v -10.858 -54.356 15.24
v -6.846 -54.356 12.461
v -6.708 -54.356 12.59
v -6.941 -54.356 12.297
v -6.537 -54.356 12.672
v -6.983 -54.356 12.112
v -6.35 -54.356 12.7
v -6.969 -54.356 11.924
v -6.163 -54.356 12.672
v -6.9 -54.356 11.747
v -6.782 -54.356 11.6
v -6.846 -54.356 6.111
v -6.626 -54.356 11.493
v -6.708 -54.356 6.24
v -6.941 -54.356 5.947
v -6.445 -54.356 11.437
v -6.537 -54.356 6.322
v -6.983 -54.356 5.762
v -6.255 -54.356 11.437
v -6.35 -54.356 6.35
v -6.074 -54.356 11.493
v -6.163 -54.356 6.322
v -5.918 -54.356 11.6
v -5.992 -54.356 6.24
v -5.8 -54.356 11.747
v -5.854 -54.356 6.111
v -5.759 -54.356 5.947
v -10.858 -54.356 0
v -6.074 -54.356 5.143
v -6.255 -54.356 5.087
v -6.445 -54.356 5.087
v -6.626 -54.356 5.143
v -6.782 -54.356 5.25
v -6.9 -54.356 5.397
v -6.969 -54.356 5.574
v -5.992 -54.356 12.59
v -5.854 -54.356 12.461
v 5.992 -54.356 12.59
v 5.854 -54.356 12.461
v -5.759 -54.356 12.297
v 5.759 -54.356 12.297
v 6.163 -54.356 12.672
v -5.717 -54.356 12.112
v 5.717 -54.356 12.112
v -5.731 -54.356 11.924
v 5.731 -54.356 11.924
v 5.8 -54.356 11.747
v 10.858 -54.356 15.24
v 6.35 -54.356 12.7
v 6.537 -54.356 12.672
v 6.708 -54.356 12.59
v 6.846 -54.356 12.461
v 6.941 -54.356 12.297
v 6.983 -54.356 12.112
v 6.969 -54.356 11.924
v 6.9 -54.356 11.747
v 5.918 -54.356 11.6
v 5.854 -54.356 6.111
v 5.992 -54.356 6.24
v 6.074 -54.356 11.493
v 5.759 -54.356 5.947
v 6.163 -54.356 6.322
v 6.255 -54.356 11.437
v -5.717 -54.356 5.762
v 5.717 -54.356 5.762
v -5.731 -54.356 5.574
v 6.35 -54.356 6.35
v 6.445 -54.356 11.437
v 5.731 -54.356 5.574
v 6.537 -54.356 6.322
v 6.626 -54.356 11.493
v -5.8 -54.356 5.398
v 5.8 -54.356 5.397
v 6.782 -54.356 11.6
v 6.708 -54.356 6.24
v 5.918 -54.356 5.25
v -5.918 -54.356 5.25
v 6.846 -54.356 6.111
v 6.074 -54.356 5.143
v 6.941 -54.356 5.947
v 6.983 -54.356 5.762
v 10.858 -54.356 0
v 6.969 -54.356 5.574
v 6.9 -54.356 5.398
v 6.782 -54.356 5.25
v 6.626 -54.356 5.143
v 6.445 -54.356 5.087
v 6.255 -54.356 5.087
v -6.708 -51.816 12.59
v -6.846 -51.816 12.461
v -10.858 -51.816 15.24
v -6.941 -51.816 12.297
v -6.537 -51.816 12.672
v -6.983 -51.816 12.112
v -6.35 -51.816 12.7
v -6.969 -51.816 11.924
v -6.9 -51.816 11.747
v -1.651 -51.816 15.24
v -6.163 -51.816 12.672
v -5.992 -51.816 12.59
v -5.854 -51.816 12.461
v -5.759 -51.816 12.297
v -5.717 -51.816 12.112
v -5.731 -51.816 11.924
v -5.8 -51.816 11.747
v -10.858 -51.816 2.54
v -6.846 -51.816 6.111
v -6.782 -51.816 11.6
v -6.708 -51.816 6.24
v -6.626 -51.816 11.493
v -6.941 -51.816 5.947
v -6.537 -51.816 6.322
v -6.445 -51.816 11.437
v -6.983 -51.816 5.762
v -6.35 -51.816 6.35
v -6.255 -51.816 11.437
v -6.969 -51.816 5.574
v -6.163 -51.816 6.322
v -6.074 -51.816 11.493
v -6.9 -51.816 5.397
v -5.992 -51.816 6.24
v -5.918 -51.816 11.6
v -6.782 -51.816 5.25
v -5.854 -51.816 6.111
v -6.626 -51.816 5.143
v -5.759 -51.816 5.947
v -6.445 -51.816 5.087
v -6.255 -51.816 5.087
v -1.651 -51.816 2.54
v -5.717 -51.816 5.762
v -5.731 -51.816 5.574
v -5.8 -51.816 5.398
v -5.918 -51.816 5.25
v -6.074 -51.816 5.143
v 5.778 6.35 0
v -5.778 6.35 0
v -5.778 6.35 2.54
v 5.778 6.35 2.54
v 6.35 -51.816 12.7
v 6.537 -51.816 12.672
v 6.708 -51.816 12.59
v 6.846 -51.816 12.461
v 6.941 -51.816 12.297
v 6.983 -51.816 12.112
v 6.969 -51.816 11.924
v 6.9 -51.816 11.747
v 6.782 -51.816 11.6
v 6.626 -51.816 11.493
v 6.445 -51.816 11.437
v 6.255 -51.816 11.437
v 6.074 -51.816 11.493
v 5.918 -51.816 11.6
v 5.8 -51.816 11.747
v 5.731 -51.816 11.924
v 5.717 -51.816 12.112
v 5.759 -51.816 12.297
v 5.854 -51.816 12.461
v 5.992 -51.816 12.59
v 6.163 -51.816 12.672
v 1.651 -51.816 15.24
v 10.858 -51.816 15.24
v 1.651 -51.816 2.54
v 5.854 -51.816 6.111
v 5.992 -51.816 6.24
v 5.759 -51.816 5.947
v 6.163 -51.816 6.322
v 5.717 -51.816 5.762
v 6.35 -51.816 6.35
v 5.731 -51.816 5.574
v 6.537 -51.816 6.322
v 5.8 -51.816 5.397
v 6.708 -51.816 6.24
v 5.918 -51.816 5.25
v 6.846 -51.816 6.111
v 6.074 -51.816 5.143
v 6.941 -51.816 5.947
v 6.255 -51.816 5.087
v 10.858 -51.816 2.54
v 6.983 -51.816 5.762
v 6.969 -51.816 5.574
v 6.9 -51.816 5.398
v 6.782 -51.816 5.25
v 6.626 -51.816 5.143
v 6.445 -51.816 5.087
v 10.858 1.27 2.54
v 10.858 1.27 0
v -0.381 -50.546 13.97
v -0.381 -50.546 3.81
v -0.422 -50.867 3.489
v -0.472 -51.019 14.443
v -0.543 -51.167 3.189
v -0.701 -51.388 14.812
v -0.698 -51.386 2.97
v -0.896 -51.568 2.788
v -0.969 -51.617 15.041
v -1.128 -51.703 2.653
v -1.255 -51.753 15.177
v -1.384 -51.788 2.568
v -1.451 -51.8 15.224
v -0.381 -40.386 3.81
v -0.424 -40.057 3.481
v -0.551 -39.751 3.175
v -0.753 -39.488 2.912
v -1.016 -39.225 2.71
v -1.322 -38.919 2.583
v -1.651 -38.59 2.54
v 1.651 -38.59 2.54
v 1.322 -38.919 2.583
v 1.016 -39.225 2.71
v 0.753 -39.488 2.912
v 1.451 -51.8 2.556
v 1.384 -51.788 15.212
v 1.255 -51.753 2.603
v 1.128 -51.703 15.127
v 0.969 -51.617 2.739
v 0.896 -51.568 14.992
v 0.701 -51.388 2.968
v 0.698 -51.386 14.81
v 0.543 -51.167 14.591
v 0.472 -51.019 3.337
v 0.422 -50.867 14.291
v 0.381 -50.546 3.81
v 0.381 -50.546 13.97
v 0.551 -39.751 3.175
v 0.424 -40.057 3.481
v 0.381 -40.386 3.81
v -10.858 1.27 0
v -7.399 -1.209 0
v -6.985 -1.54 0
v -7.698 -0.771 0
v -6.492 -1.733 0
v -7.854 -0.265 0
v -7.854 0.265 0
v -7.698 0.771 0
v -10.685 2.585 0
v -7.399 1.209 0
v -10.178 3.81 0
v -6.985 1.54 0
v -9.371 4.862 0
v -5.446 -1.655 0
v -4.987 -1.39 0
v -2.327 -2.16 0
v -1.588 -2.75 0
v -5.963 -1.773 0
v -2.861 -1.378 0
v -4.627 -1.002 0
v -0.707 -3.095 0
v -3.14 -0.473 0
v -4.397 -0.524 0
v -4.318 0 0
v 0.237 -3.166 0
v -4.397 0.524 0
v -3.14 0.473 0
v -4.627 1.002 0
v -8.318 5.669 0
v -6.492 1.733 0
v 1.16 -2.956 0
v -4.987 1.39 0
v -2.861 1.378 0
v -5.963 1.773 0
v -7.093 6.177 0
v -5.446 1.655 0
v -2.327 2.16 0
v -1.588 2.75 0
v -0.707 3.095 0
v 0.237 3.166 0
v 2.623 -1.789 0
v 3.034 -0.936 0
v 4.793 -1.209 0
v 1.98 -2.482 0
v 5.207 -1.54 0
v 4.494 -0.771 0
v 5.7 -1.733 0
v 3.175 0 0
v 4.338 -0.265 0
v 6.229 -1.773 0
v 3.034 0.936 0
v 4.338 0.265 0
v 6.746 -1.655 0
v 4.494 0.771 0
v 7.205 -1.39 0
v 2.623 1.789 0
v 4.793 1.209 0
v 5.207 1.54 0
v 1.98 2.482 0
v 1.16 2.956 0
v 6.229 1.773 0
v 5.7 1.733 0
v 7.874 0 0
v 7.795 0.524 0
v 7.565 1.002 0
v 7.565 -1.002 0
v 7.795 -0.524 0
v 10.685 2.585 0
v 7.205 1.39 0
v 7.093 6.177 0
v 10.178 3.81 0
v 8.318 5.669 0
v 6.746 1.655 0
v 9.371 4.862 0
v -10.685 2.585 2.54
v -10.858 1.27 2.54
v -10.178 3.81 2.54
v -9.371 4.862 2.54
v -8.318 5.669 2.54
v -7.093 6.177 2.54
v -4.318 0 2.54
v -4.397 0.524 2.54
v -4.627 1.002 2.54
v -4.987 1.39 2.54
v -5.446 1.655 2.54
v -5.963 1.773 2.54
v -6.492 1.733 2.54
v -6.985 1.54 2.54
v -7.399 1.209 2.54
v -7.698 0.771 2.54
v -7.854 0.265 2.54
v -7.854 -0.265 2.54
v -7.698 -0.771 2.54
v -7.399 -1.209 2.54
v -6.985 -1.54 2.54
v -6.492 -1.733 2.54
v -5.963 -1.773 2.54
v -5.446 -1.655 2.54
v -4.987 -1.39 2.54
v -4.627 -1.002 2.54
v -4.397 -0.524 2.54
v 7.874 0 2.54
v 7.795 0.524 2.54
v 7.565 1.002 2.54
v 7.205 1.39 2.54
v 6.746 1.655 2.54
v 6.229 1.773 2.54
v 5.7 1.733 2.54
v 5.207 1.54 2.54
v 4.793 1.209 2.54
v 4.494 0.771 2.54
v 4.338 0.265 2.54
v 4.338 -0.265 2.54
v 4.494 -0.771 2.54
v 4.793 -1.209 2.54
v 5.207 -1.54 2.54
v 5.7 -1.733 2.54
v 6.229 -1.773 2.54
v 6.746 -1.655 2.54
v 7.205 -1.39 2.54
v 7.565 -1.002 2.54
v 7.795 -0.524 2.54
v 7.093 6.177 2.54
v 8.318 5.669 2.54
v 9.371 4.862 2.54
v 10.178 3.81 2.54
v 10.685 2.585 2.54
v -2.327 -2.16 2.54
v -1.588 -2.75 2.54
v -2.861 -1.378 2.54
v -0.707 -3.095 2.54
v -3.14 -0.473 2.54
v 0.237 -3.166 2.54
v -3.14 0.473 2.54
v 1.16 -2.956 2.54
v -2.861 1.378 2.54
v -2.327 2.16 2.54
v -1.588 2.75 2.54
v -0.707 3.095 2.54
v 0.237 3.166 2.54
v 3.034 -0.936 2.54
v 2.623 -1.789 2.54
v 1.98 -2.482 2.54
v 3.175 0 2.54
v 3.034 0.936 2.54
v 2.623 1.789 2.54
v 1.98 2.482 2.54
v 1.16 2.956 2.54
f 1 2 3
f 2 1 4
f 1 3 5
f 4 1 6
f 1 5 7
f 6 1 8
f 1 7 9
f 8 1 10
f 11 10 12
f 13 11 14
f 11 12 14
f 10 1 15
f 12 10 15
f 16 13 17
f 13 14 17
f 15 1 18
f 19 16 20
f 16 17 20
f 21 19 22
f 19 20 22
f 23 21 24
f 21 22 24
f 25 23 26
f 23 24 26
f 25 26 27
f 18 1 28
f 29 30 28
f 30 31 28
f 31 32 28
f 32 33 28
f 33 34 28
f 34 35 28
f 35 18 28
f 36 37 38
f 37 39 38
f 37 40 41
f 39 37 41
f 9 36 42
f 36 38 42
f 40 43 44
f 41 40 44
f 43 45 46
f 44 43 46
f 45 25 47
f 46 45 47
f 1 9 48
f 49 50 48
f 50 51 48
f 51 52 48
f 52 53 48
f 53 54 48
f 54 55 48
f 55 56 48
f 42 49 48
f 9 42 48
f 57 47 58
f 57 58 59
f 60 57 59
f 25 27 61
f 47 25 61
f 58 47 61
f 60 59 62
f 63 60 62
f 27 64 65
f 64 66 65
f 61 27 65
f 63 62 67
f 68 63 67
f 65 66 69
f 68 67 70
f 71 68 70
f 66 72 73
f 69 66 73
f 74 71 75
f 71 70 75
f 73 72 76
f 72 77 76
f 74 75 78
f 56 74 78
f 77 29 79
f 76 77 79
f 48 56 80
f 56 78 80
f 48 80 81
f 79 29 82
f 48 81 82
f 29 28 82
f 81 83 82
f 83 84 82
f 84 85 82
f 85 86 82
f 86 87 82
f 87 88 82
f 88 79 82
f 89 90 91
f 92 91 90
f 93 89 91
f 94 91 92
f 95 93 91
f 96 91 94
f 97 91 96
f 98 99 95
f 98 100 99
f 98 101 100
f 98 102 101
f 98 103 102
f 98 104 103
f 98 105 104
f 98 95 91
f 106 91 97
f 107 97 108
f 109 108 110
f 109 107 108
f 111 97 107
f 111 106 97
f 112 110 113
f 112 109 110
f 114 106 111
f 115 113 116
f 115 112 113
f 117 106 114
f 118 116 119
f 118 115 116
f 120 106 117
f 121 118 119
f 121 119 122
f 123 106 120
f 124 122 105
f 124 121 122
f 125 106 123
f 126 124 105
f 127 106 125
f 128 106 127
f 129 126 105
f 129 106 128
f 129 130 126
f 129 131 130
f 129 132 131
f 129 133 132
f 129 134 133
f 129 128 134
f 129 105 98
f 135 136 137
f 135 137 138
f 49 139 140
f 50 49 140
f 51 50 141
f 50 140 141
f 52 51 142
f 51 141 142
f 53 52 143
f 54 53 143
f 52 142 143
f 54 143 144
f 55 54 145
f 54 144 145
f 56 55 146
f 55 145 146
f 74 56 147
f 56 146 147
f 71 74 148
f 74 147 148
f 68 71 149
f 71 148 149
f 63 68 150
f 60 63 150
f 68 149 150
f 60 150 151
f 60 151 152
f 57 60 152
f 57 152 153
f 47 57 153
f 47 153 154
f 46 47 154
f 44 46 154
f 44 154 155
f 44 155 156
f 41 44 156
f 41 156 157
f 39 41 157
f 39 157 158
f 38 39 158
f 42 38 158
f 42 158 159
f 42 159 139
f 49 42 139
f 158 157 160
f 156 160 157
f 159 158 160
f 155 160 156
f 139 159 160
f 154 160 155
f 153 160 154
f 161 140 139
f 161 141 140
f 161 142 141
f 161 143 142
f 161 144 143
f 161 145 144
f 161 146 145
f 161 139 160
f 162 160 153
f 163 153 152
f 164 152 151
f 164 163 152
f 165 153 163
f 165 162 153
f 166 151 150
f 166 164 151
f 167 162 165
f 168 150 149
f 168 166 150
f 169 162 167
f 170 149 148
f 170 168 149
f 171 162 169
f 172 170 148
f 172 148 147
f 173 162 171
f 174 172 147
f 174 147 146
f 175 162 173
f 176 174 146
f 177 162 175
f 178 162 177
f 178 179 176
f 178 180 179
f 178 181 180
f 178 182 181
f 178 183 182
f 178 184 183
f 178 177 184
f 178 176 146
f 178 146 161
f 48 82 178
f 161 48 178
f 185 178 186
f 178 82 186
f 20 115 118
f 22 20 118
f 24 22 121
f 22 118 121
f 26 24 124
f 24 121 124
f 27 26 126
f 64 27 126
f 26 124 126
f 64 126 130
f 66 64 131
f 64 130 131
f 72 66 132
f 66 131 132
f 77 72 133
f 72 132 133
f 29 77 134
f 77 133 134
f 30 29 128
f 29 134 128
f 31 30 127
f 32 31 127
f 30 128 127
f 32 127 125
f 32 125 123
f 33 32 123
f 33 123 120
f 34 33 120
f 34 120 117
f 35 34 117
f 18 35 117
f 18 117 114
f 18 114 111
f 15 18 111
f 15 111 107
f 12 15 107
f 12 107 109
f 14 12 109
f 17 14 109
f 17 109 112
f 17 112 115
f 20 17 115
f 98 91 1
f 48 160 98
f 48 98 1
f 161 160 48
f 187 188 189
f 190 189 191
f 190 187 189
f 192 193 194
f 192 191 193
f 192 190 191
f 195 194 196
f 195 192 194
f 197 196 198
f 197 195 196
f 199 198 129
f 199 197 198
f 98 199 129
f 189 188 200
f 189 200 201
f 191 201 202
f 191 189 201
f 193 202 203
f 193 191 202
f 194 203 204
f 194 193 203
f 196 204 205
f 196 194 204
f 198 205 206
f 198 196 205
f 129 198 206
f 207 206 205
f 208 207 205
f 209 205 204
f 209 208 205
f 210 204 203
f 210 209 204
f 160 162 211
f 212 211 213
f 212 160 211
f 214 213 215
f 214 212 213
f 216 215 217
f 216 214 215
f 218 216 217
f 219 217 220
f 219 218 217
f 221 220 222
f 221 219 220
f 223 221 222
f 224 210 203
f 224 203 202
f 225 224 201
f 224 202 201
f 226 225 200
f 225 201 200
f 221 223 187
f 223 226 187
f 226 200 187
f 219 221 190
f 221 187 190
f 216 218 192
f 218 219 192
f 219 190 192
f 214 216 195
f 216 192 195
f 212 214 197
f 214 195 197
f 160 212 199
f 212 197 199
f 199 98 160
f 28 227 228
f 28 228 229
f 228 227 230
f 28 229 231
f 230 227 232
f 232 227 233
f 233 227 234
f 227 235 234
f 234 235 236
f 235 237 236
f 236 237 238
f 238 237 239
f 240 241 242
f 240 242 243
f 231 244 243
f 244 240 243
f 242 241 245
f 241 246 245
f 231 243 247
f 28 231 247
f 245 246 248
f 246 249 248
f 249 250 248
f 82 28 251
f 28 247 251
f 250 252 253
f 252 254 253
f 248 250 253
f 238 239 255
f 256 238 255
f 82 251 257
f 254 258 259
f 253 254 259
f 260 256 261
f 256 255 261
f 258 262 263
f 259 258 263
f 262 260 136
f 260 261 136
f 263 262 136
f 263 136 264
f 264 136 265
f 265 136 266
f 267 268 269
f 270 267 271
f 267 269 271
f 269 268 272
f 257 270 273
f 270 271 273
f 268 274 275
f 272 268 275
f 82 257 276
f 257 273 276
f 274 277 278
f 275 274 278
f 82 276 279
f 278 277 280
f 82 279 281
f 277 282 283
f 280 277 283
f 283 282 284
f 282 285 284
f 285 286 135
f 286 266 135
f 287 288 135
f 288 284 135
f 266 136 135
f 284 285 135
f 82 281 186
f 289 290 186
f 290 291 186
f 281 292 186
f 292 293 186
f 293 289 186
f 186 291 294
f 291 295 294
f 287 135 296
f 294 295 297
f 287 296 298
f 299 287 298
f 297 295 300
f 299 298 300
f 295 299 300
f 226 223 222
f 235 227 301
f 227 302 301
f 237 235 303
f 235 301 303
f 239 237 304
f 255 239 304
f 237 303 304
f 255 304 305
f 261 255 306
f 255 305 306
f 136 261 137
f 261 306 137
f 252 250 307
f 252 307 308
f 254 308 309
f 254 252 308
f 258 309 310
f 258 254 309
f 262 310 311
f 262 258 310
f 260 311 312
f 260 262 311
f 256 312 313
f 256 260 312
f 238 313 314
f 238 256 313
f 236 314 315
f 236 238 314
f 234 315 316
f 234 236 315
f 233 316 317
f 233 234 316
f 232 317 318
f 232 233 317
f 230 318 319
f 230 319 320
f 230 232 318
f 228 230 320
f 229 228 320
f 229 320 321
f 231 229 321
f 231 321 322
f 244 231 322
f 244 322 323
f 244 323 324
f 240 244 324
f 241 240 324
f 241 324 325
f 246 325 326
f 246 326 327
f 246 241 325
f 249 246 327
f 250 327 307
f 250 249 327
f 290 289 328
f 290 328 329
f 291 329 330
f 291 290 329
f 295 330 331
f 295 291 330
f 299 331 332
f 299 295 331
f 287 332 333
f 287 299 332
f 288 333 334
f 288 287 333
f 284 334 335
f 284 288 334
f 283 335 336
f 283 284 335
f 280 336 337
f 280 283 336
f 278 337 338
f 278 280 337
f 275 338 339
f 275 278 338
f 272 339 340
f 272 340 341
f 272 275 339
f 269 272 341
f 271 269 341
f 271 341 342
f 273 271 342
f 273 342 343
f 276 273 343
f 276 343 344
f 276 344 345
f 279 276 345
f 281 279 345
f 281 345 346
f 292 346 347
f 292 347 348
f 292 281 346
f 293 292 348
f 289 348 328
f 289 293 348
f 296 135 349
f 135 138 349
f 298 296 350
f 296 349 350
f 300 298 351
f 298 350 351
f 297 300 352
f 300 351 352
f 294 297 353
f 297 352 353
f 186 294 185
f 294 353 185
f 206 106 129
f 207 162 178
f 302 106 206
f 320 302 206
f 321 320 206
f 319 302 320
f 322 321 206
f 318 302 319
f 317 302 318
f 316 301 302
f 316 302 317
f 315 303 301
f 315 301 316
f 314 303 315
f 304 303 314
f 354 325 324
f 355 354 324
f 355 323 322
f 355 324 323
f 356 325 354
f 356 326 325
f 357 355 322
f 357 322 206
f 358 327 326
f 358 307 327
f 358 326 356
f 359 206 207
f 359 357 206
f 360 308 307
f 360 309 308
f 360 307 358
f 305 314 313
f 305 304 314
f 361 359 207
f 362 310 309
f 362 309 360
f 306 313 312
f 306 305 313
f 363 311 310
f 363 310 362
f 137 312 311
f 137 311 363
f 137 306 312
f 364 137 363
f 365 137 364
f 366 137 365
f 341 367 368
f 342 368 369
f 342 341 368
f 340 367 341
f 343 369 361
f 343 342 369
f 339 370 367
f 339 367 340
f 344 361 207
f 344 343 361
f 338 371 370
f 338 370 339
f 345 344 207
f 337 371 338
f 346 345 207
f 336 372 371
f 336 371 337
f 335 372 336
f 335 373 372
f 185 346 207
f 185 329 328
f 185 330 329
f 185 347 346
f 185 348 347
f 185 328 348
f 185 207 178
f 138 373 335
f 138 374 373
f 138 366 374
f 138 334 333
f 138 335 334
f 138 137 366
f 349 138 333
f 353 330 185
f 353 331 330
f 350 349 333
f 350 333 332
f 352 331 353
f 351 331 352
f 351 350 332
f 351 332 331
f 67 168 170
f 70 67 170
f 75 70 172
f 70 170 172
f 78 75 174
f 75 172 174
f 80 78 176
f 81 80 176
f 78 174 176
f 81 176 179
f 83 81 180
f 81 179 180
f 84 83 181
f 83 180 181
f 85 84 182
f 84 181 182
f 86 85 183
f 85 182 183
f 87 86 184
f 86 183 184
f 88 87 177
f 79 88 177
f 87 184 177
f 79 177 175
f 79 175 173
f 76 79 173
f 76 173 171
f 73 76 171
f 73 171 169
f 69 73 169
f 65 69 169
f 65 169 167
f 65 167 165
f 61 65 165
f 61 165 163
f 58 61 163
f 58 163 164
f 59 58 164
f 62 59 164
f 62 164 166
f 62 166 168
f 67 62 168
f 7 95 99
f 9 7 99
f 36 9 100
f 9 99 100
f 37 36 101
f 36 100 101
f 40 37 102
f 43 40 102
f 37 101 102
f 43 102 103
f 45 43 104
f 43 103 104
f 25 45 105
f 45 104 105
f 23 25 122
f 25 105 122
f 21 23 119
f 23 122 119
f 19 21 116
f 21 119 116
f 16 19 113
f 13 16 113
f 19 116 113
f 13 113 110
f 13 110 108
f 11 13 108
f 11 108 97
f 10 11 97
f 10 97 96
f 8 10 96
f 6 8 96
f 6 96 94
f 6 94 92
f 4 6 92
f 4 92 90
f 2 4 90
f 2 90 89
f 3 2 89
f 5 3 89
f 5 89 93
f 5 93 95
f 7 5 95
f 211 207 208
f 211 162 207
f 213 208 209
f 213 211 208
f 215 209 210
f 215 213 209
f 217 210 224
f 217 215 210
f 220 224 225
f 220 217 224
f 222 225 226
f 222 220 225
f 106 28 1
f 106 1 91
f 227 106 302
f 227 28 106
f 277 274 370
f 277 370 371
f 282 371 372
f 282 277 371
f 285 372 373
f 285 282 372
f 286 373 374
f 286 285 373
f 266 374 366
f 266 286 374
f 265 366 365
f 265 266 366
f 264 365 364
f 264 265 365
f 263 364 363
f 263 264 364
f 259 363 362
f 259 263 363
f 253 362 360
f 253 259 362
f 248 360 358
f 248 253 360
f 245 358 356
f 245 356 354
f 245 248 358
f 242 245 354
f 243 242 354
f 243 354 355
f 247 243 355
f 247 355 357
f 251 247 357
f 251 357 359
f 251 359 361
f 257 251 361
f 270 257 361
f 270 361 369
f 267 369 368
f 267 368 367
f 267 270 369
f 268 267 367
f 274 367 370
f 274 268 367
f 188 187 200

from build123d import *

# Parameters (mm, degrees)
SKETCH2_W                = 21.717
SKETCH2_H                = 60.706
SKETCH2_R                = 3.175
SKETCH2_R_2              = 1.778
BOSS_EXTRUDE1_DEPTH      = 2.54
SKETCH3_W                = 21.717
SKETCH3_H                = 2.54
BOSS_EXTRUDE2_DEPTH      = 12.7
BOSS_EXTRUDE3_DEPTH      = 0.381
BOSS_EXTRUDE3_DEPTH_BACK = 0.381
SKETCH6_R                = 0.635
CUT_EXTRUDE1_DEPTH       = 62.101949054
FILLET1_R                = 5.08
FILLET2_R                = 1.27


with BuildPart() as part:
    # Sketch2 → Boss-Extrude1 (new body)
    with BuildSketch(Plane.XY):
        with Locations((0, -24.003)):
            Rectangle(SKETCH2_W, SKETCH2_H)
        Circle(SKETCH2_R, mode=Mode.SUBTRACT)
        with Locations((6.096, 0)):
            Circle(SKETCH2_R_2, mode=Mode.SUBTRACT)
        with Locations((-6.096, 0)):
            Circle(SKETCH2_R_2, mode=Mode.SUBTRACT)
    extrude(amount=BOSS_EXTRUDE1_DEPTH)

    # Sketch3 → Boss-Extrude2 (add)
    with BuildSketch(Plane.XY.offset(2.54)):
        with Locations((0, -53.086)):
            Rectangle(SKETCH3_W, SKETCH3_H)
    extrude(amount=BOSS_EXTRUDE2_DEPTH)

    # Sketch5 → Boss-Extrude3 (add, two sides: drawn at the far end of the back side and taken through both)
    with BuildSketch(Plane.ZY.offset(-BOSS_EXTRUDE3_DEPTH_BACK)):
        Polygon((15.24, -51.816), (2.54, -51.816), (2.54, -39.116), align=None)
    extrude(amount=BOSS_EXTRUDE3_DEPTH + BOSS_EXTRUDE3_DEPTH_BACK)

    # Sketch6 → Cut-Extrude1 (cut, through all)
    with BuildSketch(Plane(origin=(0, -51.816, 0), x_dir=(1, 0, 0), z_dir=(0, 1, 0))):
        with Locations(Location((-6.35, -5.715, 0), (0, 0, 270))):
            Circle(SKETCH6_R)
        with Locations(Location((6.35, -5.715, 0), (0, 0, 270))):
            Circle(SKETCH6_R)
        with Locations(Location((6.35, -12.065, 0), (0, 0, 270))):
            Circle(SKETCH6_R)
        with Locations(Location((-6.35, -12.065, 0), (0, 0, 270))):
            Circle(SKETCH6_R)
    extrude(amount=-CUT_EXTRUDE1_DEPTH, mode=Mode.SUBTRACT)

    # Fillet1
    fillet1_edges = [part.edges().sort_by_distance(p)[0] for p in [
        (10.8585, 6.35, 1.27),
        (-10.8585, 6.35, 1.27),
    ]]
    fillet(fillet1_edges, radius=FILLET1_R)

    # Fillet2
    # the kernel refuses this fillet: 1.27 mm, written as the material it adds along each edge
    with BuildSketch(Plane(origin=(0.381, -51.816, 2.54), x_dir=(1, 0, 0), z_dir=(0, 1, 0))) as fillet2_piece_1_section:
        with BuildLine():
            CenterArc((FILLET2_R, -FILLET2_R), FILLET2_R, 90, 90)
            Line((0, -FILLET2_R), (-FILLET2_R * 0.02, -FILLET2_R))
            Line((-FILLET2_R * 0.02, -FILLET2_R), (-FILLET2_R * 0.02, FILLET2_R * 0.02))
            Line((-FILLET2_R * 0.02, FILLET2_R * 0.02), (FILLET2_R, FILLET2_R * 0.02))
            Line((FILLET2_R, FILLET2_R * 0.02), (FILLET2_R, 0))
        make_face()
    fillet2_piece_1 = extrude(amount=15.875, mode=Mode.PRIVATE)
    fillet2_piece_1 = split(fillet2_piece_1, bisect_by=Plane(origin=(0.67208957, -42.502111902, 5.926111902), z_dir=(0, -0.7071067811865475, -0.7071067811865477)), keep=Keep.TOP, mode=Mode.PRIVATE)
    add(fillet2_piece_1)
    with BuildSketch(Plane(origin=(-0.381, -51.816, 2.54), x_dir=(-1, 0, 0), z_dir=(0, 1, 0))) as fillet2_piece_2_section:
        with BuildLine():
            CenterArc((FILLET2_R, FILLET2_R), FILLET2_R, 180, 90)
            Line((0, FILLET2_R), (-FILLET2_R * 0.02, FILLET2_R))
            Line((-FILLET2_R * 0.02, FILLET2_R), (-FILLET2_R * 0.02, -FILLET2_R * 0.02))
            Line((-FILLET2_R * 0.02, -FILLET2_R * 0.02), (FILLET2_R, -FILLET2_R * 0.02))
            Line((FILLET2_R, -FILLET2_R * 0.02), (FILLET2_R, 0))
        make_face()
    fillet2_piece_2 = extrude(amount=15.875, mode=Mode.PRIVATE)
    fillet2_piece_2 = split(fillet2_piece_2, bisect_by=Plane(origin=(-0.67208957, -42.502111902, 5.926111902), z_dir=(0, -0.7071067811865475, -0.7071067811865477)), keep=Keep.TOP, mode=Mode.PRIVATE)
    add(fillet2_piece_2)
    with BuildSketch(Plane(origin=(-0.381, -51.816, 15.24), x_dir=(0, 1, 0), z_dir=(0, 0, -1))) as fillet2_piece_3_section:
        with BuildLine():
            CenterArc((FILLET2_R, -FILLET2_R), FILLET2_R, 90, 90)
            Line((0, -FILLET2_R), (-FILLET2_R * 0.02, -FILLET2_R))
            Line((-FILLET2_R * 0.02, -FILLET2_R), (-FILLET2_R * 0.02, FILLET2_R * 0.02))
            Line((-FILLET2_R * 0.02, FILLET2_R * 0.02), (FILLET2_R, FILLET2_R * 0.02))
            Line((FILLET2_R, FILLET2_R * 0.02), (FILLET2_R, 0))
        make_face()
    fillet2_piece_3 = extrude(amount=12.7, mode=Mode.PRIVATE)
    fillet2_piece_3 = split(fillet2_piece_3, bisect_by=Plane(origin=(-0.672062457, -48.429609874, 11.853609874), z_dir=(0, -0.7071067811865475, -0.7071067811865477)), keep=Keep.TOP, mode=Mode.PRIVATE)
    add(fillet2_piece_3)
    with BuildSketch(Plane(origin=(0.381, -51.816, 15.24), x_dir=(1, 0, 0), z_dir=(0, 0, -1))) as fillet2_piece_4_section:
        with BuildLine():
            CenterArc((FILLET2_R, -FILLET2_R), FILLET2_R, 90, 90)
            Line((0, -FILLET2_R), (-FILLET2_R * 0.02, -FILLET2_R))
            Line((-FILLET2_R * 0.02, -FILLET2_R), (-FILLET2_R * 0.02, FILLET2_R * 0.02))
            Line((-FILLET2_R * 0.02, FILLET2_R * 0.02), (FILLET2_R, FILLET2_R * 0.02))
            Line((FILLET2_R, FILLET2_R * 0.02), (FILLET2_R, 0))
        make_face()
    fillet2_piece_4 = extrude(amount=12.7, mode=Mode.PRIVATE)
    fillet2_piece_4 = split(fillet2_piece_4, bisect_by=Plane(origin=(0.672062457, -48.429609874, 11.853609874), z_dir=(0, -0.7071067811865475, -0.7071067811865477)), keep=Keep.TOP, mode=Mode.PRIVATE)
    add(fillet2_piece_4)
    with BuildSketch(Plane(origin=(0.381, -39.116, 2.54), x_dir=(0, 1, 0), z_dir=(-1, 0, 0))) as fillet2_piece_5:
        with BuildLine():
            CenterArc((FILLET2_R * 0.414213562373, -FILLET2_R), FILLET2_R, 90, 45)
            Line((-FILLET2_R * 0.292893218813, -FILLET2_R * 0.292893218813), (-FILLET2_R * 0.307035354437, -FILLET2_R * 0.27875108319))
            Line((-FILLET2_R * 0.307035354437, -FILLET2_R * 0.27875108319), (-FILLET2_R * 0.00828427124746, FILLET2_R * 0.02))
            Line((-FILLET2_R * 0.00828427124746, FILLET2_R * 0.02), (FILLET2_R * 0.414213562373, FILLET2_R * 0.02))
            Line((FILLET2_R * 0.414213562373, FILLET2_R * 0.02), (FILLET2_R * 0.414213562373, 0))
        make_face()
    extrude(amount=0.762)
    with BuildSketch(Plane(origin=(0.381, -54.991, 2.54), x_dir=(1, 0, 0), z_dir=(0, 1, 0))) as fillet2_piece_6a_section:
        with BuildLine():
            CenterArc((FILLET2_R, -FILLET2_R), FILLET2_R, 90, 90)
            Line((0, -FILLET2_R), (-FILLET2_R * 0.02, -FILLET2_R))
            Line((-FILLET2_R * 0.02, -FILLET2_R), (-FILLET2_R * 0.02, FILLET2_R * 0.02))
            Line((-FILLET2_R * 0.02, FILLET2_R * 0.02), (FILLET2_R, FILLET2_R * 0.02))
            Line((FILLET2_R, FILLET2_R * 0.02), (FILLET2_R, 0))
        make_face()
    fillet2_piece_6a = extrude(amount=19.05, mode=Mode.PRIVATE)
    fillet2_piece_6a = split(fillet2_piece_6a, bisect_by=Plane(origin=(0.668521795, -51.816, 2.827521795), z_dir=(0, -1, 0)), keep=Keep.TOP, mode=Mode.PRIVATE)
    with BuildSketch(Plane(origin=(0.381, -51.816, 15.24), x_dir=(1, 0, 0), z_dir=(0, 0, -1))) as fillet2_piece_6b_section:
        with BuildLine():
            CenterArc((FILLET2_R, -FILLET2_R), FILLET2_R, 90, 90)
            Line((0, -FILLET2_R), (-FILLET2_R * 0.02, -FILLET2_R))
            Line((-FILLET2_R * 0.02, -FILLET2_R), (-FILLET2_R * 0.02, FILLET2_R * 0.02))
            Line((-FILLET2_R * 0.02, FILLET2_R * 0.02), (FILLET2_R, FILLET2_R * 0.02))
            Line((FILLET2_R, FILLET2_R * 0.02), (FILLET2_R, 0))
        make_face()
    fillet2_piece_6b = extrude(amount=15.875, mode=Mode.PRIVATE)
    fillet2_piece_6b = split(fillet2_piece_6b, bisect_by=Plane(origin=(0.668521795, -51.528478205, 2.54), z_dir=(0, 0, -1)), keep=Keep.TOP, mode=Mode.PRIVATE)
    fillet2_piece_6 = fillet2_piece_6a & fillet2_piece_6b
    add(fillet2_piece_6)
    with BuildSketch(Plane(origin=(0.381, -51.816, 2.54), x_dir=(1, 0, 0), z_dir=(0, 1, 0))) as fillet2_piece_7a_section:
        with BuildLine():
            CenterArc((FILLET2_R, -FILLET2_R), FILLET2_R, 90, 90)
            Line((0, -FILLET2_R), (-FILLET2_R * 0.02, -FILLET2_R))
            Line((-FILLET2_R * 0.02, -FILLET2_R), (-FILLET2_R * 0.02, FILLET2_R * 0.02))
            Line((-FILLET2_R * 0.02, FILLET2_R * 0.02), (FILLET2_R, FILLET2_R * 0.02))
            Line((FILLET2_R, FILLET2_R * 0.02), (FILLET2_R, 0))
        make_face()
    fillet2_piece_7a = extrude(amount=15.875, mode=Mode.PRIVATE)
    fillet2_piece_7a = split(fillet2_piece_7a, bisect_by=Plane(origin=(0.655732005, -38.554128536, 1.978128536), z_dir=(0, 0.7071067811865475, 0.7071067811865477)), keep=Keep.TOP, mode=Mode.PRIVATE)
    with BuildSketch(Plane(origin=(1.696128061, -39.116, 2.54), x_dir=(0, 1, 0), z_dir=(-1, 0, 0))) as fillet2_piece_7b_section:
        with BuildLine():
            CenterArc((FILLET2_R * 0.414213562373, -FILLET2_R), FILLET2_R, 90, 45)
            Line((-FILLET2_R * 0.292893218813, -FILLET2_R * 0.292893218813), (-FILLET2_R * 0.307035354437, -FILLET2_R * 0.27875108319))
            Line((-FILLET2_R * 0.307035354437, -FILLET2_R * 0.27875108319), (-FILLET2_R * 0.00828427124746, FILLET2_R * 0.02))
            Line((-FILLET2_R * 0.00828427124746, FILLET2_R * 0.02), (FILLET2_R * 0.414213562373, FILLET2_R * 0.02))
            Line((FILLET2_R * 0.414213562373, FILLET2_R * 0.02), (FILLET2_R * 0.414213562373, 0))
        make_face()
    fillet2_piece_7b = extrude(amount=2.077128061, mode=Mode.PRIVATE)
    fillet2_piece_7b = split(fillet2_piece_7b, bisect_by=Plane(origin=(0.381, -39.083484699, 2.618498881), z_dir=(1, 0, 0)), keep=Keep.TOP, mode=Mode.PRIVATE)
    fillet2_piece_7 = fillet2_piece_7a & fillet2_piece_7b
    add(fillet2_piece_7)
    with BuildSketch(Plane(origin=(-0.381, -54.991, 2.54), x_dir=(-1, 0, 0), z_dir=(0, 1, 0))) as fillet2_piece_8a_section:
        with BuildLine():
            CenterArc((FILLET2_R, FILLET2_R), FILLET2_R, 180, 90)
            Line((0, FILLET2_R), (-FILLET2_R * 0.02, FILLET2_R))
            Line((-FILLET2_R * 0.02, FILLET2_R), (-FILLET2_R * 0.02, -FILLET2_R * 0.02))
            Line((-FILLET2_R * 0.02, -FILLET2_R * 0.02), (FILLET2_R, -FILLET2_R * 0.02))
            Line((FILLET2_R, -FILLET2_R * 0.02), (FILLET2_R, 0))
        make_face()
    fillet2_piece_8a = extrude(amount=19.05, mode=Mode.PRIVATE)
    fillet2_piece_8a = split(fillet2_piece_8a, bisect_by=Plane(origin=(-0.668521795, -51.816, 2.827521795), z_dir=(0, -1, 0)), keep=Keep.TOP, mode=Mode.PRIVATE)
    with BuildSketch(Plane(origin=(-0.381, -51.816, 15.24), x_dir=(0, 1, 0), z_dir=(0, 0, -1))) as fillet2_piece_8b_section:
        with BuildLine():
            CenterArc((FILLET2_R, -FILLET2_R), FILLET2_R, 90, 90)
            Line((0, -FILLET2_R), (-FILLET2_R * 0.02, -FILLET2_R))
            Line((-FILLET2_R * 0.02, -FILLET2_R), (-FILLET2_R * 0.02, FILLET2_R * 0.02))
            Line((-FILLET2_R * 0.02, FILLET2_R * 0.02), (FILLET2_R, FILLET2_R * 0.02))
            Line((FILLET2_R, FILLET2_R * 0.02), (FILLET2_R, 0))
        make_face()
    fillet2_piece_8b = extrude(amount=15.875, mode=Mode.PRIVATE)
    fillet2_piece_8b = split(fillet2_piece_8b, bisect_by=Plane(origin=(-0.668521795, -51.528478205, 2.54), z_dir=(0, 0, -1)), keep=Keep.TOP, mode=Mode.PRIVATE)
    fillet2_piece_8 = fillet2_piece_8a & fillet2_piece_8b
    add(fillet2_piece_8)
    with BuildSketch(Plane(origin=(0.381, -39.116, 2.54), x_dir=(0, 1, 0), z_dir=(-1, 0, 0))) as fillet2_piece_9a_section:
        with BuildLine():
            CenterArc((FILLET2_R * 0.414213562373, -FILLET2_R), FILLET2_R, 90, 45)
            Line((-FILLET2_R * 0.292893218813, -FILLET2_R * 0.292893218813), (-FILLET2_R * 0.307035354437, -FILLET2_R * 0.27875108319))
            Line((-FILLET2_R * 0.307035354437, -FILLET2_R * 0.27875108319), (-FILLET2_R * 0.00828427124746, FILLET2_R * 0.02))
            Line((-FILLET2_R * 0.00828427124746, FILLET2_R * 0.02), (FILLET2_R * 0.414213562373, FILLET2_R * 0.02))
            Line((FILLET2_R * 0.414213562373, FILLET2_R * 0.02), (FILLET2_R * 0.414213562373, 0))
        make_face()
    fillet2_piece_9a = extrude(amount=2.077128061, mode=Mode.PRIVATE)
    fillet2_piece_9a = split(fillet2_piece_9a, bisect_by=Plane(origin=(-0.381, -39.083484699, 2.618498881), z_dir=(-1, 0, 0)), keep=Keep.TOP, mode=Mode.PRIVATE)
    with BuildSketch(Plane(origin=(-0.381, -51.816, 2.54), x_dir=(-1, 0, 0), z_dir=(0, 1, 0))) as fillet2_piece_9b_section:
        with BuildLine():
            CenterArc((FILLET2_R, FILLET2_R), FILLET2_R, 180, 90)
            Line((0, FILLET2_R), (-FILLET2_R * 0.02, FILLET2_R))
            Line((-FILLET2_R * 0.02, FILLET2_R), (-FILLET2_R * 0.02, -FILLET2_R * 0.02))
            Line((-FILLET2_R * 0.02, -FILLET2_R * 0.02), (FILLET2_R, -FILLET2_R * 0.02))
            Line((FILLET2_R, -FILLET2_R * 0.02), (FILLET2_R, 0))
        make_face()
    fillet2_piece_9b = extrude(amount=15.875, mode=Mode.PRIVATE)
    fillet2_piece_9b = split(fillet2_piece_9b, bisect_by=Plane(origin=(-0.655732005, -38.554128536, 1.978128536), z_dir=(0, 0.7071067811865475, 0.7071067811865477)), keep=Keep.TOP, mode=Mode.PRIVATE)
    fillet2_piece_9 = fillet2_piece_9a & fillet2_piece_9b
    add(fillet2_piece_9)


solid = part.part
